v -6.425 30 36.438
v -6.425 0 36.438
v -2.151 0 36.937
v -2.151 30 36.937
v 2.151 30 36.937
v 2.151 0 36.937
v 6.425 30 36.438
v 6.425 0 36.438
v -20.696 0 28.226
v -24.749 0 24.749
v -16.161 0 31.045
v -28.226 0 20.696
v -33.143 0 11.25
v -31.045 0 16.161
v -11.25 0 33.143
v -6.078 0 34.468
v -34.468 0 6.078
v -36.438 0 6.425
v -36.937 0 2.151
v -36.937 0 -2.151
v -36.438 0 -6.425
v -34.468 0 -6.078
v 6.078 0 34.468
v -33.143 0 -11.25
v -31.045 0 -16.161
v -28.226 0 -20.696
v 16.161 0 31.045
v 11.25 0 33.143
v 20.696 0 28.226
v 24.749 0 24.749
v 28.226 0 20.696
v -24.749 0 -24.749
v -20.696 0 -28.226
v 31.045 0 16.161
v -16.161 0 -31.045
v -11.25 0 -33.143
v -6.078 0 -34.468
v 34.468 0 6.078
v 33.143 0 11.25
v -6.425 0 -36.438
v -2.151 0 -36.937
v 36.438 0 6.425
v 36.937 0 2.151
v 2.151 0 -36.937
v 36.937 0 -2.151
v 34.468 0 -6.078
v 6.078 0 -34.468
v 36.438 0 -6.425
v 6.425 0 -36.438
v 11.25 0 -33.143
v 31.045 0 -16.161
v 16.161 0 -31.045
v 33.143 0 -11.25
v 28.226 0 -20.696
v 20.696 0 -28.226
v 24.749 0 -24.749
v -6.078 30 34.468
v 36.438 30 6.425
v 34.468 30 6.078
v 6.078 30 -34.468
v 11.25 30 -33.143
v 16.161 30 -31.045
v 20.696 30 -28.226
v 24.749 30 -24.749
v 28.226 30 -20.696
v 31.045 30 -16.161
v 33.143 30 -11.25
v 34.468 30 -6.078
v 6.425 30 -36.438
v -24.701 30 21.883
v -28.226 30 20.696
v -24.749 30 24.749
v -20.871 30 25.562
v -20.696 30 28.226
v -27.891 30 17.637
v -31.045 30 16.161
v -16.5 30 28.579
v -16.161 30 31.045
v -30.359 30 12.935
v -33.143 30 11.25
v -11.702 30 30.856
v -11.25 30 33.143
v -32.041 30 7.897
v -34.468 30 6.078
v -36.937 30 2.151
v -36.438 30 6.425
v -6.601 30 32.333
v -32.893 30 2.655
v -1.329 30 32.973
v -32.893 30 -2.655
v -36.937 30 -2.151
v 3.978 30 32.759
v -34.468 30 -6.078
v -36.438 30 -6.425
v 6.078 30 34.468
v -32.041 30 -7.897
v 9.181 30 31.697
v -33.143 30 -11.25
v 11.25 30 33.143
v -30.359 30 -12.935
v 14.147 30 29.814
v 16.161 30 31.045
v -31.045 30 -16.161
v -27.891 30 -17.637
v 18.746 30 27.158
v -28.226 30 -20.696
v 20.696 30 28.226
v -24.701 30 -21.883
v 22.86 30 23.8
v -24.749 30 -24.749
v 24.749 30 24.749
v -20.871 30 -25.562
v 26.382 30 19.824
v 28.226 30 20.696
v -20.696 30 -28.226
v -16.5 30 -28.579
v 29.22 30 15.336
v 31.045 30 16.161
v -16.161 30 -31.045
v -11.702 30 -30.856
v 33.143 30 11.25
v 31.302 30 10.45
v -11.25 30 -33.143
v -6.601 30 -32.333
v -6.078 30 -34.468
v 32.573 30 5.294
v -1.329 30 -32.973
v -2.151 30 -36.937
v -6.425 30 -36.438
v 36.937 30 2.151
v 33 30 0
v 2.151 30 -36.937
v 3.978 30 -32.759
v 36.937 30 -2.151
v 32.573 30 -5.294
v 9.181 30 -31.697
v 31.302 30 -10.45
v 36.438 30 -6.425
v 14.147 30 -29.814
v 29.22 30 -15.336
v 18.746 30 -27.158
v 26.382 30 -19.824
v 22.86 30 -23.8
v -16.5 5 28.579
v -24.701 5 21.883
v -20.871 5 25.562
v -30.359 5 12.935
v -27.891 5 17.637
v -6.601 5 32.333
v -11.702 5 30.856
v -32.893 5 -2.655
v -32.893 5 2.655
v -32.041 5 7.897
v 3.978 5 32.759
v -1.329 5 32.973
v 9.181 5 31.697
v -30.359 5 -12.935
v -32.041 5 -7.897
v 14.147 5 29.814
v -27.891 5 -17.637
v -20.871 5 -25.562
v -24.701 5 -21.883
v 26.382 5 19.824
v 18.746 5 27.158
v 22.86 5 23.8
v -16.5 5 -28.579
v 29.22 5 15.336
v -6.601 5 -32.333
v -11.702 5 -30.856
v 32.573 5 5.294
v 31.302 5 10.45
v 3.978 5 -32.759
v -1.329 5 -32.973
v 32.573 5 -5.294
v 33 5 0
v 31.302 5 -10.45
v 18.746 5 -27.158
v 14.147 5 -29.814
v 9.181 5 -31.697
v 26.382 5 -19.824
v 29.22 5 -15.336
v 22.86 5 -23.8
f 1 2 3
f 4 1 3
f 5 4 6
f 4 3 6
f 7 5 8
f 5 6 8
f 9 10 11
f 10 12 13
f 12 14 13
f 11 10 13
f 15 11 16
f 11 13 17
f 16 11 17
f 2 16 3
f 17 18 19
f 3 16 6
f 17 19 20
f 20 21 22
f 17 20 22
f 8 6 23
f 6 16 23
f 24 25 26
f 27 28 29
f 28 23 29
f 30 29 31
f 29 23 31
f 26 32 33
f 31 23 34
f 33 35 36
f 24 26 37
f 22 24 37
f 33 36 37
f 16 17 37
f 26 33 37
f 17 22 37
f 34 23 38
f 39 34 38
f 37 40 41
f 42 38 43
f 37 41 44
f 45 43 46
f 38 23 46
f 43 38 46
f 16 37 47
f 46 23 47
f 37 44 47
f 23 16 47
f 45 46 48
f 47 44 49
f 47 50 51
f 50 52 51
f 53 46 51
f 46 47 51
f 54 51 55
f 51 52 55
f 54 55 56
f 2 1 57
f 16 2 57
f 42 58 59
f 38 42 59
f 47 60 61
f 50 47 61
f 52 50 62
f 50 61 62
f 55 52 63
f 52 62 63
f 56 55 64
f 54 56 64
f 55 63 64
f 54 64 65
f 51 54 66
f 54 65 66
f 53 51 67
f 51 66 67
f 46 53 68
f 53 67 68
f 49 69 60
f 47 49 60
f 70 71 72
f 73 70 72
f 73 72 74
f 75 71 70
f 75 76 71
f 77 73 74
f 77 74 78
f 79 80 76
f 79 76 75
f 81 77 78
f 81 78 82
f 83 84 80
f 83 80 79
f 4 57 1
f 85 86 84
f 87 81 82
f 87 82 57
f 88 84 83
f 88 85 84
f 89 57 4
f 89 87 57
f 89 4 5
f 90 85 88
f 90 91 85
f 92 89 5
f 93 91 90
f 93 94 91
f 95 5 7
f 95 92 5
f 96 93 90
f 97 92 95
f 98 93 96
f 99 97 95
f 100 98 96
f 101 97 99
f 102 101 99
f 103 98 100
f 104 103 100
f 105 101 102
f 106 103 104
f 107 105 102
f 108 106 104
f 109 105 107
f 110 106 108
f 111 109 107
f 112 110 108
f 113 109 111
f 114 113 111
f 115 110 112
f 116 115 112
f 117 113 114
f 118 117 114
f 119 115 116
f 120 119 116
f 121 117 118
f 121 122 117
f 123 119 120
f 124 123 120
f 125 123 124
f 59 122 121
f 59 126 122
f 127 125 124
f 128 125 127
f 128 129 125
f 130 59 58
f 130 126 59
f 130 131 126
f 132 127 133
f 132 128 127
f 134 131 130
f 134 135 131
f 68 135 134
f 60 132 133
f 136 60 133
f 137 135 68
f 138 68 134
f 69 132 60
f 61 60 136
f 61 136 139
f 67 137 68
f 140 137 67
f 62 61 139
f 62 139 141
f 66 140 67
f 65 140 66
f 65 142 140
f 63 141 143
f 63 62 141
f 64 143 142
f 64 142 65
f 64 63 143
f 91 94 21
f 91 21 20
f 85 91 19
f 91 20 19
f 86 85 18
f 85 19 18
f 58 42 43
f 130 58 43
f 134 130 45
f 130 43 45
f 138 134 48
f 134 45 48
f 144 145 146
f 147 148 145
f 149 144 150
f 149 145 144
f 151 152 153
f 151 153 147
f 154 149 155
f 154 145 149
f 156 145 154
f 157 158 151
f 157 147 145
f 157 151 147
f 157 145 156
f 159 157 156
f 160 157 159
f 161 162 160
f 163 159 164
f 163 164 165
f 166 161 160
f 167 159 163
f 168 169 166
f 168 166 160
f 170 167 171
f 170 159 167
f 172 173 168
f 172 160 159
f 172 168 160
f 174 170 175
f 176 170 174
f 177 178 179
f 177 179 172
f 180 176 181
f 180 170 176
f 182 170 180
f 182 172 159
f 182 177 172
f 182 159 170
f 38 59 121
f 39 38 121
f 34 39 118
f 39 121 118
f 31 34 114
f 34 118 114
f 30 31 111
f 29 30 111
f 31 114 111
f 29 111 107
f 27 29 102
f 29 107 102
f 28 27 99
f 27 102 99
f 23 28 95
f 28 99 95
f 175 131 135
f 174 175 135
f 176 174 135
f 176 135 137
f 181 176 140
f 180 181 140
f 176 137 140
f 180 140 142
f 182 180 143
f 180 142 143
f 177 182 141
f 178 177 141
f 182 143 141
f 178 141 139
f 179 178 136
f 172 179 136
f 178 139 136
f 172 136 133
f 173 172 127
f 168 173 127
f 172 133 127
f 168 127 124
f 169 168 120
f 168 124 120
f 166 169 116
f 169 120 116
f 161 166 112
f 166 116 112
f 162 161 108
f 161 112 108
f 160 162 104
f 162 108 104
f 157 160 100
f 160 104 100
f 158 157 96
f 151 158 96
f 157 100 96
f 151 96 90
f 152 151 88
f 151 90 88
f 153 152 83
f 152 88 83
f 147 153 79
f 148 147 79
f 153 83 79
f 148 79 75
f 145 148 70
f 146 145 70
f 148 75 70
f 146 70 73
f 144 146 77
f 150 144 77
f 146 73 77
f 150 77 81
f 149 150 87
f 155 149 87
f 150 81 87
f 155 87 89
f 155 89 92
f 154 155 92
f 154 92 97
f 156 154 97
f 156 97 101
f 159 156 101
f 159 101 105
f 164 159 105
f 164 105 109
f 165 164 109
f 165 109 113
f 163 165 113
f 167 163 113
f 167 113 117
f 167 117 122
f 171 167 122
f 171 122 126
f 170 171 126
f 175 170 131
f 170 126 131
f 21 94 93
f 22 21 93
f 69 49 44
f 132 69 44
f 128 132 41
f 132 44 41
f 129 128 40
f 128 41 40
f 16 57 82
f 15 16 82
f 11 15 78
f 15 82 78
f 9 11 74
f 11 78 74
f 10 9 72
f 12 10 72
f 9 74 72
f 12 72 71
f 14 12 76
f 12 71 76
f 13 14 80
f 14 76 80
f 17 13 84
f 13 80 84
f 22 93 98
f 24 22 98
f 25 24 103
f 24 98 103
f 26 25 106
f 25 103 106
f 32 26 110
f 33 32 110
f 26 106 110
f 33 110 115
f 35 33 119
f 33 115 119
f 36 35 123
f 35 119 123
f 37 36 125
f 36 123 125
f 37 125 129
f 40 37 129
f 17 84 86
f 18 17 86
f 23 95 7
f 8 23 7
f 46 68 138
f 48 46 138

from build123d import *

# Parameters (mm, degrees)
SKETCH1_R           = 37
BOSS_EXTRUDE1_DEPTH = 30
CUT_EXTRUDE1_DEPTH  = 30
SKETCH3_R           = 33
CUT_EXTRUDE2_DEPTH  = 25


with BuildPart() as part:
    # Sketch1 → Boss-Extrude1 (new body)
    with BuildSketch(Plane(origin=(0, 0, 0), x_dir=(1, 0, 0), z_dir=(0, 1, 0))):
        Circle(SKETCH1_R)
    extrude(amount=BOSS_EXTRUDE1_DEPTH)

    # Sketch2 → Cut-Extrude1 (cut)
    with BuildSketch(Plane(origin=(0, 30, 0), x_dir=(1, 0, 0), z_dir=(0, 1, 0))):
        with BuildLine():
            Line((6.424982574, 36.437886861), (6.077686218, 34.468271355))
            ThreePointArc((6.077686218, 34.468271355), (24.748737342, 24.748737342), (34.468271355, 6.077686218))
            Line((34.468271355, 6.077686218), (36.437886861, 6.424982574))
            ThreePointArc((36.437886861, 6.424982574), (26.162950904, 26.162950904), (6.424982574, 36.437886861))
        make_face()
        with BuildLine():
            Line((36.437886861, -6.424982574), (34.468271355, -6.077686218))
            ThreePointArc((34.468271355, -6.077686218), (24.748737342, -24.748737342), (6.077686218, -34.468271355))
            Line((6.077686218, -34.468271355), (6.424982574, -36.437886861))
            ThreePointArc((6.424982574, -36.437886861), (26.162950904, -26.162950904), (36.437886861, -6.424982574))
        make_face()
        with BuildLine():
            Line((-6.424982574, -36.437886861), (-6.077686218, -34.468271355))
            ThreePointArc((-6.077686218, -34.468271355), (-24.748737342, -24.748737342), (-34.468271355, -6.077686218))
            Line((-34.468271355, -6.077686218), (-36.437886861, -6.424982574))
            ThreePointArc((-36.437886861, -6.424982574), (-26.162950904, -26.162950904), (-6.424982574, -36.437886861))
        make_face()
        with BuildLine():
            Line((-36.437886861, 6.424982574), (-34.468271355, 6.077686218))
            ThreePointArc((-34.468271355, 6.077686218), (-24.748737342, 24.748737342), (-6.077686218, 34.468271355))
            Line((-6.077686218, 34.468271355), (-6.424982574, 36.437886861))
            ThreePointArc((-6.424982574, 36.437886861), (-26.162950904, 26.162950904), (-36.437886861, 6.424982574))
        make_face()
    extrude(amount=-CUT_EXTRUDE1_DEPTH, mode=Mode.SUBTRACT)

    # Sketch3 → Cut-Extrude2 (cut)
    with BuildSketch(Plane(origin=(0, 30, 0), x_dir=(1, 0, 0), z_dir=(0, 1, 0))):
        Circle(SKETCH3_R)
    extrude(amount=-CUT_EXTRUDE2_DEPTH, mode=Mode.SUBTRACT)


solid = part.part
